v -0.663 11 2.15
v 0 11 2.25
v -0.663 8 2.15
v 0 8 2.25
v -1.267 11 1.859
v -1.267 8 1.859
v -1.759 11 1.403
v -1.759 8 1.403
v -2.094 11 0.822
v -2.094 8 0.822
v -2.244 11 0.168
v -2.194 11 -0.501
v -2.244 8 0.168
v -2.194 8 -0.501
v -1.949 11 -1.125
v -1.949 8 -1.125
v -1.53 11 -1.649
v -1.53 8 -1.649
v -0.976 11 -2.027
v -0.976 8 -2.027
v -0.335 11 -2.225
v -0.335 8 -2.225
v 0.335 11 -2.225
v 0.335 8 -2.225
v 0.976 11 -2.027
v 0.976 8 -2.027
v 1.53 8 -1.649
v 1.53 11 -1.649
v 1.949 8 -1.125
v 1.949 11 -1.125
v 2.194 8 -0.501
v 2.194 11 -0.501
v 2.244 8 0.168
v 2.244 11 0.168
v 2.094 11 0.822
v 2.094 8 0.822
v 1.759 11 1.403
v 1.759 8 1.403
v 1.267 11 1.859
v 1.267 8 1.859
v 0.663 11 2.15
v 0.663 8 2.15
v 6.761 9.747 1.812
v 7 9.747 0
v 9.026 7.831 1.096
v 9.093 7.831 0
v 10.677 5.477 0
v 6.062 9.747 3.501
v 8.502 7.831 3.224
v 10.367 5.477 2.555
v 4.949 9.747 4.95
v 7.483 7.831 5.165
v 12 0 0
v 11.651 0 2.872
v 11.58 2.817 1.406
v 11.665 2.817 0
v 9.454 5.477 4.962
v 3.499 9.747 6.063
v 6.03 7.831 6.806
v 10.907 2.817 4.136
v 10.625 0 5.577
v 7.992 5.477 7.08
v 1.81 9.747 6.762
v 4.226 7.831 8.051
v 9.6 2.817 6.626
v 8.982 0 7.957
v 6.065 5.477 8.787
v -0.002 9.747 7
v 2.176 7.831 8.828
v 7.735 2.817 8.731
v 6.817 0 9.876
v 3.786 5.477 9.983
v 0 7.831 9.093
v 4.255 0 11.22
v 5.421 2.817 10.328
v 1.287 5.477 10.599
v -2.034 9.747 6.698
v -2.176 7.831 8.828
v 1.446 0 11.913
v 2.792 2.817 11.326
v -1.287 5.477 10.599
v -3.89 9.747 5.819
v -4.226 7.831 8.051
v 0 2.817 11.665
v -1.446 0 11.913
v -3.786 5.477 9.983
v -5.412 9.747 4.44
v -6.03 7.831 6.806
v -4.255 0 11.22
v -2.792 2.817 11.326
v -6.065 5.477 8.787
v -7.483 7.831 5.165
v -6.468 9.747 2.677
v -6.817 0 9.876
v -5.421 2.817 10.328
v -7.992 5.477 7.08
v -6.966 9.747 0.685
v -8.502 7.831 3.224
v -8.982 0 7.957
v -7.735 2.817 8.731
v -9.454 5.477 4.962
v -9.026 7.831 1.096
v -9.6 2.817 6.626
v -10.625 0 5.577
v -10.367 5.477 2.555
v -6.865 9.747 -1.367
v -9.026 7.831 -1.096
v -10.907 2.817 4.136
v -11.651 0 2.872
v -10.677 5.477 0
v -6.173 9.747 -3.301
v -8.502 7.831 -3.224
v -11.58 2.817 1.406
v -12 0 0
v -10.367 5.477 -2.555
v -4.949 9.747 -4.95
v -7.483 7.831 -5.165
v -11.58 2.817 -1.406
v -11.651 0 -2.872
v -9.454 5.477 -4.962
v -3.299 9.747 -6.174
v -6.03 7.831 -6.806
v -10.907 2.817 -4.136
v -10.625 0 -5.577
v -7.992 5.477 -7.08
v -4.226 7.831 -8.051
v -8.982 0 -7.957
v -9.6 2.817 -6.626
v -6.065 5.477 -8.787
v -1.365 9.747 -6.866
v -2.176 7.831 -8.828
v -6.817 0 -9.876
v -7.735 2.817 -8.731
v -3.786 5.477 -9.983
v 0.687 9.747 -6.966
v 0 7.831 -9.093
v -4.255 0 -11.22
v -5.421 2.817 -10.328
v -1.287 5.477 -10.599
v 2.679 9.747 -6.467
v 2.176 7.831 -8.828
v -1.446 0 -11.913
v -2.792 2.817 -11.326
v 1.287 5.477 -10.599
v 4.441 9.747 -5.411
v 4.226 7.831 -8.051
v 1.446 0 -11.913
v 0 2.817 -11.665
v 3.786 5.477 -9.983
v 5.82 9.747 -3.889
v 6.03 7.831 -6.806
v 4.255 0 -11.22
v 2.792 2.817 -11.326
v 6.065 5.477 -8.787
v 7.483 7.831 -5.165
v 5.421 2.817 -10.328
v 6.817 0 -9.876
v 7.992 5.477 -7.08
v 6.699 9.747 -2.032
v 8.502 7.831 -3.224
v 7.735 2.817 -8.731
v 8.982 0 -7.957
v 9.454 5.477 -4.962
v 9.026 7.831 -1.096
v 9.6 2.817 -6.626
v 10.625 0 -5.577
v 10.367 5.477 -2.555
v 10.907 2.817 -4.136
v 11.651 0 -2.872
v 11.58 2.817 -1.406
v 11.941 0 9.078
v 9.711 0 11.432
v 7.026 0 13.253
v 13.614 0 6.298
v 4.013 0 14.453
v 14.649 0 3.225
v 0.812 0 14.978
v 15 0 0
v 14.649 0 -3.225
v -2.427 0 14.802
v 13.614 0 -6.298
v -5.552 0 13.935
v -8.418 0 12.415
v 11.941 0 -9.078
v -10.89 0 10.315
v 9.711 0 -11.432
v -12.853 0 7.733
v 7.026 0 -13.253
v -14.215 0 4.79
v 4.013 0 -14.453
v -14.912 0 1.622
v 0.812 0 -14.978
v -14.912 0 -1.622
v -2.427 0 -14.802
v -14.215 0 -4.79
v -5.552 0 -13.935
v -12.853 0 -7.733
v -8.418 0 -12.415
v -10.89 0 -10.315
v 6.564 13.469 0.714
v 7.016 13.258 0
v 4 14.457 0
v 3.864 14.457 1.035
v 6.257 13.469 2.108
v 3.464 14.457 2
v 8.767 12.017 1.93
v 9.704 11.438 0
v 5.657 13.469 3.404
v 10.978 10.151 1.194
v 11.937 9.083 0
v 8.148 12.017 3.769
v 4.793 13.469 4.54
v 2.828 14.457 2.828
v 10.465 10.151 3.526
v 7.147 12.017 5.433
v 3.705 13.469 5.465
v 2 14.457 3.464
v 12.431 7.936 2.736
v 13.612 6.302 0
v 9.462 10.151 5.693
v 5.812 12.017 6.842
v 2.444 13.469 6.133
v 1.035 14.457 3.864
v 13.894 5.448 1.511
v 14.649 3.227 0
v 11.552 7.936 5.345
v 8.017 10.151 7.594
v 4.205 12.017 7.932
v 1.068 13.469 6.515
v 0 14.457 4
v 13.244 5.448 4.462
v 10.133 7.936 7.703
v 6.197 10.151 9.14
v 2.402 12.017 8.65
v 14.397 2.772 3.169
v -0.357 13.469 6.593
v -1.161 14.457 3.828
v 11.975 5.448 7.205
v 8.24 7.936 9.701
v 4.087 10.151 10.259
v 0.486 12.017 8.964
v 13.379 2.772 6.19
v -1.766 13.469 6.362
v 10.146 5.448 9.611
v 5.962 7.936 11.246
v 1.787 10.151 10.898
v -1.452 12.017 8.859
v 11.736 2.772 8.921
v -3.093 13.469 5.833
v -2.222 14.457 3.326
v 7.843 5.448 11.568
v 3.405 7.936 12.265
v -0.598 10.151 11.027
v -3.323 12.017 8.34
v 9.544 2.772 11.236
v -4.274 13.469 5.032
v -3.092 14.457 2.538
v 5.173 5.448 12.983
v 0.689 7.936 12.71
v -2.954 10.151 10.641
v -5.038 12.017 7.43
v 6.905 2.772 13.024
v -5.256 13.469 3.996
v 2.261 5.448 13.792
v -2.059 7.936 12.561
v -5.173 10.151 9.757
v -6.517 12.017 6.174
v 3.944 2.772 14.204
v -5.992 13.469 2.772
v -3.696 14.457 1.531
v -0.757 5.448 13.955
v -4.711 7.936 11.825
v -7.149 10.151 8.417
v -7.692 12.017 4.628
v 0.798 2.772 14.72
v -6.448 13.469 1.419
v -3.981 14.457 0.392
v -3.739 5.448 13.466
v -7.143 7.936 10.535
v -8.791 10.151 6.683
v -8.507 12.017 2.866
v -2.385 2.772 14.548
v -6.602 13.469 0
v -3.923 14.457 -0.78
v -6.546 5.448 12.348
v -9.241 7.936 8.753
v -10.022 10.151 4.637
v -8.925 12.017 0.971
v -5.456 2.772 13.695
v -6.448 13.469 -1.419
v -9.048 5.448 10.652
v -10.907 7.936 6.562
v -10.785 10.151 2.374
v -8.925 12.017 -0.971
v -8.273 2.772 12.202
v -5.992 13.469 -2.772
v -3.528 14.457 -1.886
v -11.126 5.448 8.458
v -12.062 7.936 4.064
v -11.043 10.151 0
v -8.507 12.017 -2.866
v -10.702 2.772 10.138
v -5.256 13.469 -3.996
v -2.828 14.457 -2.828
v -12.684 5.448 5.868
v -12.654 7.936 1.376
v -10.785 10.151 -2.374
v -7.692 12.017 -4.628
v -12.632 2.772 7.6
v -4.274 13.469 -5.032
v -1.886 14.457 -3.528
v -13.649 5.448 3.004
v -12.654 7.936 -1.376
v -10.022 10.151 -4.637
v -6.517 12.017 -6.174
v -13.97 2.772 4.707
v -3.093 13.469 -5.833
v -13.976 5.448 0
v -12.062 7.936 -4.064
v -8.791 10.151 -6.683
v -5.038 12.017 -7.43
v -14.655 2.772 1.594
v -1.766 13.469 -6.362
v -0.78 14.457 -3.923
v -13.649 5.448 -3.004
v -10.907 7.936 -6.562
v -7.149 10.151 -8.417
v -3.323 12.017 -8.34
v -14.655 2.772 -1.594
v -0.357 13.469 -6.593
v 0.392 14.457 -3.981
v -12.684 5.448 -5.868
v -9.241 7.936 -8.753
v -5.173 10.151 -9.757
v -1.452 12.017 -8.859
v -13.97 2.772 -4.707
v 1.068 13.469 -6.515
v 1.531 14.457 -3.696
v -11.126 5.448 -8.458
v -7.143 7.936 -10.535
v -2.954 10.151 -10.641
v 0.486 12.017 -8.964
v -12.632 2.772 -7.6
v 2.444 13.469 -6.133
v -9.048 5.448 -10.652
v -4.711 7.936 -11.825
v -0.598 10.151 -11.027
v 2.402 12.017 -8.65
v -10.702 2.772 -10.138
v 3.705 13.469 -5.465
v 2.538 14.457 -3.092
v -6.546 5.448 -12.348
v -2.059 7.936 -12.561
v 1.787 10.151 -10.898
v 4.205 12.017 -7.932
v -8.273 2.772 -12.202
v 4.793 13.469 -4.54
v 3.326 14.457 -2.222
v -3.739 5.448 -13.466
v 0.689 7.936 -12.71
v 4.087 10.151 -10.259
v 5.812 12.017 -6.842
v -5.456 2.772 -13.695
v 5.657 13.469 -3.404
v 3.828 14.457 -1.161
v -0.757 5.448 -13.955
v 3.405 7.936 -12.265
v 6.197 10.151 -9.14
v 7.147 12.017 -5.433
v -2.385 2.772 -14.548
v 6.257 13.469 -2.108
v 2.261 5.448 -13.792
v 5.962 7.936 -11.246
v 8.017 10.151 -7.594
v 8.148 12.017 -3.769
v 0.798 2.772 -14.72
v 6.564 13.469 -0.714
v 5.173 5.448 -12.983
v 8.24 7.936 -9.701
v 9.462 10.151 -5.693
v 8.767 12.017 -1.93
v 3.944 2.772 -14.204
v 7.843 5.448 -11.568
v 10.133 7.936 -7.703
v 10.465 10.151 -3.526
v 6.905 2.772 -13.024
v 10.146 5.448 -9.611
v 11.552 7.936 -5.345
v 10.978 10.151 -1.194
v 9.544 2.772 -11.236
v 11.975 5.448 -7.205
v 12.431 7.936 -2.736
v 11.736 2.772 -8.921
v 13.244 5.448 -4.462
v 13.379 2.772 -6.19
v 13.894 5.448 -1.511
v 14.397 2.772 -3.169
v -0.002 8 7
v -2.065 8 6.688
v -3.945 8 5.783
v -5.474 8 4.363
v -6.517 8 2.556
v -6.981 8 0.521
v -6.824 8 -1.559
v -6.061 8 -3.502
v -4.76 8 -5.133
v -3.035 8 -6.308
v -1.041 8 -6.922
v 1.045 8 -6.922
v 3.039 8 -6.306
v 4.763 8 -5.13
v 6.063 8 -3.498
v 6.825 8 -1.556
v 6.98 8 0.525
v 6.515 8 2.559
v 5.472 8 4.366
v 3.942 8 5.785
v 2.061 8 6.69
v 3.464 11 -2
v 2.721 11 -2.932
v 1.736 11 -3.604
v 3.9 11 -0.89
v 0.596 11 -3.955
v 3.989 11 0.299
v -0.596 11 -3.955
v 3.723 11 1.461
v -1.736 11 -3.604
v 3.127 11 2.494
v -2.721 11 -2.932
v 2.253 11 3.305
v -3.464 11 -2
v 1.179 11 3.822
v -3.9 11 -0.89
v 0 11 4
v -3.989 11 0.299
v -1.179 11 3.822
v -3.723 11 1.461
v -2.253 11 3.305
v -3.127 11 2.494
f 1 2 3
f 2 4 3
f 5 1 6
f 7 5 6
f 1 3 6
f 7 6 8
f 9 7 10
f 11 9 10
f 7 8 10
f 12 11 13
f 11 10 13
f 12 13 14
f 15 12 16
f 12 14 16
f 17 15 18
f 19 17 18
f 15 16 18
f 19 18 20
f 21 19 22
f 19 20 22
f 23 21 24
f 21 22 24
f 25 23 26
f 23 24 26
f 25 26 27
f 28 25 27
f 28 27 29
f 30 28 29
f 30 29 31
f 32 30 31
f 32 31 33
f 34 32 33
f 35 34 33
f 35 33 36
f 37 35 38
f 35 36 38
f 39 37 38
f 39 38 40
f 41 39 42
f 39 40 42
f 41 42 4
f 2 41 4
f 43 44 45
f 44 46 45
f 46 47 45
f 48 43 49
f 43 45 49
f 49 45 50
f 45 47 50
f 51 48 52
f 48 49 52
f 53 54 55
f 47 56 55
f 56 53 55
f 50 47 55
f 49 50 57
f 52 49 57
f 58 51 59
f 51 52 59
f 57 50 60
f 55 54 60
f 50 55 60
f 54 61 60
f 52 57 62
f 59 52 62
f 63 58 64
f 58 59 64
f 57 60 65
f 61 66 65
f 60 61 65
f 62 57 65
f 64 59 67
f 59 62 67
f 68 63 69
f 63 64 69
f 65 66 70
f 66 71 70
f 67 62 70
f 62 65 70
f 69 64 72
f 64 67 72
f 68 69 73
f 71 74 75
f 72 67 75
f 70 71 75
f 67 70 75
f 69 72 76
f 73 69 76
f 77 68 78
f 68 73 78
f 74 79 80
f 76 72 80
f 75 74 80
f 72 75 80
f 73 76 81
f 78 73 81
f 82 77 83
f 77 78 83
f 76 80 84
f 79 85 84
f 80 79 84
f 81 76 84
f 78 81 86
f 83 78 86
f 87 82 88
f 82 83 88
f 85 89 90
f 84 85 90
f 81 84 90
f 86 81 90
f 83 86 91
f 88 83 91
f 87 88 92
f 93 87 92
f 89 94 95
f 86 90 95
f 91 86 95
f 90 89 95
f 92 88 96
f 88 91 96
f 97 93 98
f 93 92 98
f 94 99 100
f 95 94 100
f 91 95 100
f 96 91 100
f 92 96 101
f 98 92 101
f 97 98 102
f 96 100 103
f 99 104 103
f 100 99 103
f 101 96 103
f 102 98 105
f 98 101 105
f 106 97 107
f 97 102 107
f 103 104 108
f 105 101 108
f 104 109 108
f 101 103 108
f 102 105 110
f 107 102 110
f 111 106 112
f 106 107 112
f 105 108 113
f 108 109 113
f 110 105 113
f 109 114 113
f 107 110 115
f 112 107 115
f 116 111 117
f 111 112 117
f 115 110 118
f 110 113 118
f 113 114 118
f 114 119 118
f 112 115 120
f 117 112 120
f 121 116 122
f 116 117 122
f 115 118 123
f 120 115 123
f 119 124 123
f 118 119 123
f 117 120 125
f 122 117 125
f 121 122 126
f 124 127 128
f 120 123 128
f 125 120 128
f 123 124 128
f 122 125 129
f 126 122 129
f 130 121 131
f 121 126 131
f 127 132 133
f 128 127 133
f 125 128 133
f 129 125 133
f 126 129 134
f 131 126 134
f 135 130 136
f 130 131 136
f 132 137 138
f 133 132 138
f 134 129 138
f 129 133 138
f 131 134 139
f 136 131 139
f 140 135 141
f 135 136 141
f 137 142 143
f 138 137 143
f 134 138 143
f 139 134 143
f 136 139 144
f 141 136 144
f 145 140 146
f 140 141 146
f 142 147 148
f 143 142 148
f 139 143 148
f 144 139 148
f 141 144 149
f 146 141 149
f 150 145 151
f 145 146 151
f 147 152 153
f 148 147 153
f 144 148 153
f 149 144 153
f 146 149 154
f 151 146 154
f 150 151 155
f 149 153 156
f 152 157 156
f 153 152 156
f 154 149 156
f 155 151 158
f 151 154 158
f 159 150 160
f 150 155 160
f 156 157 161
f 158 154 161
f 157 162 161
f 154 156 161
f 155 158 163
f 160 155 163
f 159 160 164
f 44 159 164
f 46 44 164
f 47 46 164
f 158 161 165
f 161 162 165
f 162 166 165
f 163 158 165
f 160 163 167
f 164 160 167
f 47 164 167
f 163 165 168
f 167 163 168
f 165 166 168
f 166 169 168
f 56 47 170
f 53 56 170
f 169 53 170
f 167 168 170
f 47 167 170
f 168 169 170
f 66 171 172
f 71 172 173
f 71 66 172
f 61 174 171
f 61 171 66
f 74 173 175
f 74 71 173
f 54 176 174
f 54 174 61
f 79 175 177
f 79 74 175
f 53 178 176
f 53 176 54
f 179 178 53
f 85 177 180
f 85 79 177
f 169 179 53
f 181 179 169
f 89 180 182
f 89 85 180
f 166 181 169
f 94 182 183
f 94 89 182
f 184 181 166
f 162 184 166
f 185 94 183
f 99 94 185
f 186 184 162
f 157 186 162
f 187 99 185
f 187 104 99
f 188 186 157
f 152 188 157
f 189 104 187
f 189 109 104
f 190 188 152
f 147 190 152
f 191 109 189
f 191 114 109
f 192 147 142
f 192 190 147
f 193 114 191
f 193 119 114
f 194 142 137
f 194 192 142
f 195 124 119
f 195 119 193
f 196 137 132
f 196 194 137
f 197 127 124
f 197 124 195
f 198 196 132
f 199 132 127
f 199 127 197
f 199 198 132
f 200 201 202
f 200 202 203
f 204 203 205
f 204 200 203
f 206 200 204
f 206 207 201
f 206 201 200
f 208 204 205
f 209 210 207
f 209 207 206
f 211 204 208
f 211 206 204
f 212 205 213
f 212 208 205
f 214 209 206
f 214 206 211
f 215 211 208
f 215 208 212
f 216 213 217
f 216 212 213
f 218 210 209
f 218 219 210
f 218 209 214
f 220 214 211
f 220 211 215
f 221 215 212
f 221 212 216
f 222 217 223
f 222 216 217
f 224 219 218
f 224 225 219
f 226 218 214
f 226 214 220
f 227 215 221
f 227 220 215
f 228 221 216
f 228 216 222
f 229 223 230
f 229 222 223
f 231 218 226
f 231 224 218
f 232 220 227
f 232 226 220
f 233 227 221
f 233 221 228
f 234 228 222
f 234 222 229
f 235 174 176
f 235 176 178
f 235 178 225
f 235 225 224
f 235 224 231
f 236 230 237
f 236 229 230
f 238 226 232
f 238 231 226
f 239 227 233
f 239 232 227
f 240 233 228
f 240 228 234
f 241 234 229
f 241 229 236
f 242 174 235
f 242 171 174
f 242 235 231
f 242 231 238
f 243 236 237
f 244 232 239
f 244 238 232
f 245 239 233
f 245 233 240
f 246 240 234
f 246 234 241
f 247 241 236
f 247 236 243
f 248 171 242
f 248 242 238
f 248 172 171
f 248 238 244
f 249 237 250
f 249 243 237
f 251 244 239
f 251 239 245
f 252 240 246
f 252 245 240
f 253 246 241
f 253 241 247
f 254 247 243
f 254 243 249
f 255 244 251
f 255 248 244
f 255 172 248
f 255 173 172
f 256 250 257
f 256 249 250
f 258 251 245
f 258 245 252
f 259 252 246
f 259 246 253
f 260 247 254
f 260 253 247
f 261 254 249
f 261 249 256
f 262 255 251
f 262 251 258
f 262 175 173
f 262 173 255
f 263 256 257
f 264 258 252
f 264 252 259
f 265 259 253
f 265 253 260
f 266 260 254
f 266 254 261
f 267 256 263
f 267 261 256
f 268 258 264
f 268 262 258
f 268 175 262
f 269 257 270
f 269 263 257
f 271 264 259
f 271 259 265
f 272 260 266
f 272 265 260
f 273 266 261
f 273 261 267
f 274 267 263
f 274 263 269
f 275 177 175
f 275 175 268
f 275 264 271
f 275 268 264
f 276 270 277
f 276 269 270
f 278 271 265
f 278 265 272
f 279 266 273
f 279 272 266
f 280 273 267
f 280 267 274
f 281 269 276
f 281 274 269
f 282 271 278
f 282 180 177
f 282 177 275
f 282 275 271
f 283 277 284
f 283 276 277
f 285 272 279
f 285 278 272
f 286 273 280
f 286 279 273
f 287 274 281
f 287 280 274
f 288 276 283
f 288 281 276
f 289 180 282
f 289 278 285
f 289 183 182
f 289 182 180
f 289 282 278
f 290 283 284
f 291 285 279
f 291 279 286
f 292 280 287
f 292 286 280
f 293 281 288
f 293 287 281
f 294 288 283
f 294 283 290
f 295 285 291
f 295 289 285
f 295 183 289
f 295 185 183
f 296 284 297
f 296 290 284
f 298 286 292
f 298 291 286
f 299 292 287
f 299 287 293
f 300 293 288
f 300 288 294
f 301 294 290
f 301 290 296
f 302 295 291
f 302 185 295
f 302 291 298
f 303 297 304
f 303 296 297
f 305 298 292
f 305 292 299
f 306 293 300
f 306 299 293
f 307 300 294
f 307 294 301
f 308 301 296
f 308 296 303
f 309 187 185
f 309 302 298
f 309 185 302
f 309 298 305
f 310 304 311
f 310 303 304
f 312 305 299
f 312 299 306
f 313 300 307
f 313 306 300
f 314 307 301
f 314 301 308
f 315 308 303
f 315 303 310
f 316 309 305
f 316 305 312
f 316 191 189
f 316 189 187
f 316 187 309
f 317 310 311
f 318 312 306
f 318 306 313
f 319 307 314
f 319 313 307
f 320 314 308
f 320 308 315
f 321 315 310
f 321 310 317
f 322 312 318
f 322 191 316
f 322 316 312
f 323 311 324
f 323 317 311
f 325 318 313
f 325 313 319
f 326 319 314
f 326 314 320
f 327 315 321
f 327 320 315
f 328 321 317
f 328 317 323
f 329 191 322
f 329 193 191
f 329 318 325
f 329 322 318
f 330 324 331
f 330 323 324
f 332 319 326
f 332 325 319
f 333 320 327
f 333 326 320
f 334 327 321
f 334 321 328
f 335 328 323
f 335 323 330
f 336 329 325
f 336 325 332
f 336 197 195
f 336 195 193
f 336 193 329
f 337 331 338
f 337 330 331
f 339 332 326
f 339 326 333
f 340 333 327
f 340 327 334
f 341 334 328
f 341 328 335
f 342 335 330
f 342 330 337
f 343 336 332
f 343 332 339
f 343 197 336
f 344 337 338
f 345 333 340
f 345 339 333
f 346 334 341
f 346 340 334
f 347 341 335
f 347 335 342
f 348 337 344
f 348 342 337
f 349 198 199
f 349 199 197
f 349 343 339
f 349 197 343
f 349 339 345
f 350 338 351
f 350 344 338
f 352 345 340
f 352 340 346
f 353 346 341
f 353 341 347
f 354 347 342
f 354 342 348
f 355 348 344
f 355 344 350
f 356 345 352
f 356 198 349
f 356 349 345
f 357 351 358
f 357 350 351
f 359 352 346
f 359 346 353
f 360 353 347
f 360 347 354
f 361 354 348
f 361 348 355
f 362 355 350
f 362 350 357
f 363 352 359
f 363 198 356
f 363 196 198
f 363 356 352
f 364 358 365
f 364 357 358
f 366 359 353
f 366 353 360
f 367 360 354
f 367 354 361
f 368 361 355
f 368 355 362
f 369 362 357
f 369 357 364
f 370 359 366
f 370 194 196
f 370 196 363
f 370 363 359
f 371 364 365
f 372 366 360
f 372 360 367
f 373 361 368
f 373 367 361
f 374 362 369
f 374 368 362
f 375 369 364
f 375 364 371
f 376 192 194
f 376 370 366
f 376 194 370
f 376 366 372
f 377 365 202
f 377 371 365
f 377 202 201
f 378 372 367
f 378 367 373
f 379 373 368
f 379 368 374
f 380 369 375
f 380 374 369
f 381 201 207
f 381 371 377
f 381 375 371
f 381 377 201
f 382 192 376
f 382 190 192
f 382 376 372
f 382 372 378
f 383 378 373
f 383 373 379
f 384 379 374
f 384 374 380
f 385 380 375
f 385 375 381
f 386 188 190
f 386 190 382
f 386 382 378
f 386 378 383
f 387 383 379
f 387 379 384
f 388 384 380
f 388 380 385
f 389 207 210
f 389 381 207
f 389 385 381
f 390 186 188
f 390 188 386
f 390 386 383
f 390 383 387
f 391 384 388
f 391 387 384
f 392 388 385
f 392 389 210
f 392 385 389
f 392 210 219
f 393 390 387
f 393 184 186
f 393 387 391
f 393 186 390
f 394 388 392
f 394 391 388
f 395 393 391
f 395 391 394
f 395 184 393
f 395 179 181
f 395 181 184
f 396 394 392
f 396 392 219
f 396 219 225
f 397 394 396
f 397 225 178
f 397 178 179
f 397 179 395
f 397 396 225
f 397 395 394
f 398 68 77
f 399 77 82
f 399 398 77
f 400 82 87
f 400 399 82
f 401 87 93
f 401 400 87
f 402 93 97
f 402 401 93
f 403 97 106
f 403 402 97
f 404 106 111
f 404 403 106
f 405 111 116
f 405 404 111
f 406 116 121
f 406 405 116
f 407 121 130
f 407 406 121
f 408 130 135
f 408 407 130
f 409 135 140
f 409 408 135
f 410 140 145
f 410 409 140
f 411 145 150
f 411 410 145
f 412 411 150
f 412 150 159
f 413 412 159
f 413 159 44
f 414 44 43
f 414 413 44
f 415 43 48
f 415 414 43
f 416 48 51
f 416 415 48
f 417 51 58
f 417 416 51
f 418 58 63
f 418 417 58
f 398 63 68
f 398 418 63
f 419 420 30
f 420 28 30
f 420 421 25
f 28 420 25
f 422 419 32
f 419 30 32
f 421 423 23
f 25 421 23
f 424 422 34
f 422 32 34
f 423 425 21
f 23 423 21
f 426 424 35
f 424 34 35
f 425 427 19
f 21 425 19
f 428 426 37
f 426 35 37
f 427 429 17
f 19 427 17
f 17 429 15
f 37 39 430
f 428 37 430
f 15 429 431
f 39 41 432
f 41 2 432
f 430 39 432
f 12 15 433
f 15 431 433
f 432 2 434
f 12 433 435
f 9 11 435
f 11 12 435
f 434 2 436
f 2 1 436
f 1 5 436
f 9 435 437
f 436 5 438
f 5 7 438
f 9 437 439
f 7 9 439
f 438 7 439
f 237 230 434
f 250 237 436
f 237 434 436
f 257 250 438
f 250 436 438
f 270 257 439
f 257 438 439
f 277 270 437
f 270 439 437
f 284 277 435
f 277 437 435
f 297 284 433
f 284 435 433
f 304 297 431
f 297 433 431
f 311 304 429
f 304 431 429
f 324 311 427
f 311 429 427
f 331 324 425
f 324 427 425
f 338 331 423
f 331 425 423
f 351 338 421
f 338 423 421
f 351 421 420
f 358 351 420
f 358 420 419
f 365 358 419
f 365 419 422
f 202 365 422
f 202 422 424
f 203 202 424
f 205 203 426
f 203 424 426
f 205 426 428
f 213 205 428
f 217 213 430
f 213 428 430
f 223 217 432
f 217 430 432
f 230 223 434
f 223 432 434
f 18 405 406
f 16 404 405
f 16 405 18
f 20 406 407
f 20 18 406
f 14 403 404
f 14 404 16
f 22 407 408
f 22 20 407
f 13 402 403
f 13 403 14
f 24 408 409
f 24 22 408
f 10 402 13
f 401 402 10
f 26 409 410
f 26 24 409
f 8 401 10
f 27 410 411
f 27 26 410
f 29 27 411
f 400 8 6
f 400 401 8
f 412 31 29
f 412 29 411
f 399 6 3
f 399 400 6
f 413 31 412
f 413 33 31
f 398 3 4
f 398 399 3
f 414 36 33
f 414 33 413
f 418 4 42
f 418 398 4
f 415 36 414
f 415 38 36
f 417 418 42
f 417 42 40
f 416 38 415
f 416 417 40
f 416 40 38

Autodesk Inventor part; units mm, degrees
ref_plane "YZ Plane" through (0, 0, 0) normal (1, 0, 0) x (0, 1, 0)
ref_plane "XY Plane" through (0, 0, 0) normal (0, 0, 1) x (1, 0, 0)
sketch "Sketch1" plane through (0, 0, 0) normal (0, 0, 1) x (1, 0, 0)
  line L0 (0, 0) -> (0, 15)
  line L1 (0, 0) -> (15, 0)
  arc A0 (15, 0) -> (0, 15) centre (0, 0) ccw
  line L2 (0, -3.621321) -> (0, 21.727922)
  dimension "d2" = 15
sketch "Sketch1 outline for Revolution1" plane through (0, 0, 0) normal (0, 0, 1) x (1, 0, 0)
  line L0 (0, 0) -> (0, 15)
  arc A0 (0, 15) -> (15, 0) centre (0, 0) cw
  line L1 (15, 0) -> (0, 0)
revolve "Revolution1" add sketch "Sketch1 outline for Revolution1" angle 360 about axis through (0, -10, 0) along (0, 1, 0)
ref_plane "Work Plane1" through (0, 15, 0) normal (0, 1, 0) x (-1, 0, 0)
sketch "Sketch2" plane through (0, 15, 0) normal (0, 1, 0) x (-1, 0, 0)
  point P0 (0, 0)
  point P1 (0, 0)
hole "Hole1" at (0, 15, 0) direction (0, -1, 0) diameter 4.5 end through all counterbore diameter 8 counterbore depth 4 clearance for "Socket Head Cap Screw" size "M4" standard "Ansi Metric M Profile"
shell "Shell1" thickness 3 removed faces 1 at (10.599241, 0, 1.286981)
sketch "Sketch3" plane through (0, 0, 0) normal (0, -1, 0) x (1, 0, 0)
  circle A0 centre (0, 0) radius 5.25 projected
  circle A1 centre (0, 0) radius 2.25 projected
sketch "Sketch3 outline for Extrusion1" plane through (0, 0, 0) normal (0, -1, 0) x (1, 0, 0)
  circle A0 centre (0, 0) radius 5.25
  circle A1 centre (0, 0) radius 2.25
extrude "Extrusion1" cut sketch "Sketch3 outline for Extrusion1" against normal blind 8
properties part number "Ball_Upper Half" material "Nylon 6/6"
